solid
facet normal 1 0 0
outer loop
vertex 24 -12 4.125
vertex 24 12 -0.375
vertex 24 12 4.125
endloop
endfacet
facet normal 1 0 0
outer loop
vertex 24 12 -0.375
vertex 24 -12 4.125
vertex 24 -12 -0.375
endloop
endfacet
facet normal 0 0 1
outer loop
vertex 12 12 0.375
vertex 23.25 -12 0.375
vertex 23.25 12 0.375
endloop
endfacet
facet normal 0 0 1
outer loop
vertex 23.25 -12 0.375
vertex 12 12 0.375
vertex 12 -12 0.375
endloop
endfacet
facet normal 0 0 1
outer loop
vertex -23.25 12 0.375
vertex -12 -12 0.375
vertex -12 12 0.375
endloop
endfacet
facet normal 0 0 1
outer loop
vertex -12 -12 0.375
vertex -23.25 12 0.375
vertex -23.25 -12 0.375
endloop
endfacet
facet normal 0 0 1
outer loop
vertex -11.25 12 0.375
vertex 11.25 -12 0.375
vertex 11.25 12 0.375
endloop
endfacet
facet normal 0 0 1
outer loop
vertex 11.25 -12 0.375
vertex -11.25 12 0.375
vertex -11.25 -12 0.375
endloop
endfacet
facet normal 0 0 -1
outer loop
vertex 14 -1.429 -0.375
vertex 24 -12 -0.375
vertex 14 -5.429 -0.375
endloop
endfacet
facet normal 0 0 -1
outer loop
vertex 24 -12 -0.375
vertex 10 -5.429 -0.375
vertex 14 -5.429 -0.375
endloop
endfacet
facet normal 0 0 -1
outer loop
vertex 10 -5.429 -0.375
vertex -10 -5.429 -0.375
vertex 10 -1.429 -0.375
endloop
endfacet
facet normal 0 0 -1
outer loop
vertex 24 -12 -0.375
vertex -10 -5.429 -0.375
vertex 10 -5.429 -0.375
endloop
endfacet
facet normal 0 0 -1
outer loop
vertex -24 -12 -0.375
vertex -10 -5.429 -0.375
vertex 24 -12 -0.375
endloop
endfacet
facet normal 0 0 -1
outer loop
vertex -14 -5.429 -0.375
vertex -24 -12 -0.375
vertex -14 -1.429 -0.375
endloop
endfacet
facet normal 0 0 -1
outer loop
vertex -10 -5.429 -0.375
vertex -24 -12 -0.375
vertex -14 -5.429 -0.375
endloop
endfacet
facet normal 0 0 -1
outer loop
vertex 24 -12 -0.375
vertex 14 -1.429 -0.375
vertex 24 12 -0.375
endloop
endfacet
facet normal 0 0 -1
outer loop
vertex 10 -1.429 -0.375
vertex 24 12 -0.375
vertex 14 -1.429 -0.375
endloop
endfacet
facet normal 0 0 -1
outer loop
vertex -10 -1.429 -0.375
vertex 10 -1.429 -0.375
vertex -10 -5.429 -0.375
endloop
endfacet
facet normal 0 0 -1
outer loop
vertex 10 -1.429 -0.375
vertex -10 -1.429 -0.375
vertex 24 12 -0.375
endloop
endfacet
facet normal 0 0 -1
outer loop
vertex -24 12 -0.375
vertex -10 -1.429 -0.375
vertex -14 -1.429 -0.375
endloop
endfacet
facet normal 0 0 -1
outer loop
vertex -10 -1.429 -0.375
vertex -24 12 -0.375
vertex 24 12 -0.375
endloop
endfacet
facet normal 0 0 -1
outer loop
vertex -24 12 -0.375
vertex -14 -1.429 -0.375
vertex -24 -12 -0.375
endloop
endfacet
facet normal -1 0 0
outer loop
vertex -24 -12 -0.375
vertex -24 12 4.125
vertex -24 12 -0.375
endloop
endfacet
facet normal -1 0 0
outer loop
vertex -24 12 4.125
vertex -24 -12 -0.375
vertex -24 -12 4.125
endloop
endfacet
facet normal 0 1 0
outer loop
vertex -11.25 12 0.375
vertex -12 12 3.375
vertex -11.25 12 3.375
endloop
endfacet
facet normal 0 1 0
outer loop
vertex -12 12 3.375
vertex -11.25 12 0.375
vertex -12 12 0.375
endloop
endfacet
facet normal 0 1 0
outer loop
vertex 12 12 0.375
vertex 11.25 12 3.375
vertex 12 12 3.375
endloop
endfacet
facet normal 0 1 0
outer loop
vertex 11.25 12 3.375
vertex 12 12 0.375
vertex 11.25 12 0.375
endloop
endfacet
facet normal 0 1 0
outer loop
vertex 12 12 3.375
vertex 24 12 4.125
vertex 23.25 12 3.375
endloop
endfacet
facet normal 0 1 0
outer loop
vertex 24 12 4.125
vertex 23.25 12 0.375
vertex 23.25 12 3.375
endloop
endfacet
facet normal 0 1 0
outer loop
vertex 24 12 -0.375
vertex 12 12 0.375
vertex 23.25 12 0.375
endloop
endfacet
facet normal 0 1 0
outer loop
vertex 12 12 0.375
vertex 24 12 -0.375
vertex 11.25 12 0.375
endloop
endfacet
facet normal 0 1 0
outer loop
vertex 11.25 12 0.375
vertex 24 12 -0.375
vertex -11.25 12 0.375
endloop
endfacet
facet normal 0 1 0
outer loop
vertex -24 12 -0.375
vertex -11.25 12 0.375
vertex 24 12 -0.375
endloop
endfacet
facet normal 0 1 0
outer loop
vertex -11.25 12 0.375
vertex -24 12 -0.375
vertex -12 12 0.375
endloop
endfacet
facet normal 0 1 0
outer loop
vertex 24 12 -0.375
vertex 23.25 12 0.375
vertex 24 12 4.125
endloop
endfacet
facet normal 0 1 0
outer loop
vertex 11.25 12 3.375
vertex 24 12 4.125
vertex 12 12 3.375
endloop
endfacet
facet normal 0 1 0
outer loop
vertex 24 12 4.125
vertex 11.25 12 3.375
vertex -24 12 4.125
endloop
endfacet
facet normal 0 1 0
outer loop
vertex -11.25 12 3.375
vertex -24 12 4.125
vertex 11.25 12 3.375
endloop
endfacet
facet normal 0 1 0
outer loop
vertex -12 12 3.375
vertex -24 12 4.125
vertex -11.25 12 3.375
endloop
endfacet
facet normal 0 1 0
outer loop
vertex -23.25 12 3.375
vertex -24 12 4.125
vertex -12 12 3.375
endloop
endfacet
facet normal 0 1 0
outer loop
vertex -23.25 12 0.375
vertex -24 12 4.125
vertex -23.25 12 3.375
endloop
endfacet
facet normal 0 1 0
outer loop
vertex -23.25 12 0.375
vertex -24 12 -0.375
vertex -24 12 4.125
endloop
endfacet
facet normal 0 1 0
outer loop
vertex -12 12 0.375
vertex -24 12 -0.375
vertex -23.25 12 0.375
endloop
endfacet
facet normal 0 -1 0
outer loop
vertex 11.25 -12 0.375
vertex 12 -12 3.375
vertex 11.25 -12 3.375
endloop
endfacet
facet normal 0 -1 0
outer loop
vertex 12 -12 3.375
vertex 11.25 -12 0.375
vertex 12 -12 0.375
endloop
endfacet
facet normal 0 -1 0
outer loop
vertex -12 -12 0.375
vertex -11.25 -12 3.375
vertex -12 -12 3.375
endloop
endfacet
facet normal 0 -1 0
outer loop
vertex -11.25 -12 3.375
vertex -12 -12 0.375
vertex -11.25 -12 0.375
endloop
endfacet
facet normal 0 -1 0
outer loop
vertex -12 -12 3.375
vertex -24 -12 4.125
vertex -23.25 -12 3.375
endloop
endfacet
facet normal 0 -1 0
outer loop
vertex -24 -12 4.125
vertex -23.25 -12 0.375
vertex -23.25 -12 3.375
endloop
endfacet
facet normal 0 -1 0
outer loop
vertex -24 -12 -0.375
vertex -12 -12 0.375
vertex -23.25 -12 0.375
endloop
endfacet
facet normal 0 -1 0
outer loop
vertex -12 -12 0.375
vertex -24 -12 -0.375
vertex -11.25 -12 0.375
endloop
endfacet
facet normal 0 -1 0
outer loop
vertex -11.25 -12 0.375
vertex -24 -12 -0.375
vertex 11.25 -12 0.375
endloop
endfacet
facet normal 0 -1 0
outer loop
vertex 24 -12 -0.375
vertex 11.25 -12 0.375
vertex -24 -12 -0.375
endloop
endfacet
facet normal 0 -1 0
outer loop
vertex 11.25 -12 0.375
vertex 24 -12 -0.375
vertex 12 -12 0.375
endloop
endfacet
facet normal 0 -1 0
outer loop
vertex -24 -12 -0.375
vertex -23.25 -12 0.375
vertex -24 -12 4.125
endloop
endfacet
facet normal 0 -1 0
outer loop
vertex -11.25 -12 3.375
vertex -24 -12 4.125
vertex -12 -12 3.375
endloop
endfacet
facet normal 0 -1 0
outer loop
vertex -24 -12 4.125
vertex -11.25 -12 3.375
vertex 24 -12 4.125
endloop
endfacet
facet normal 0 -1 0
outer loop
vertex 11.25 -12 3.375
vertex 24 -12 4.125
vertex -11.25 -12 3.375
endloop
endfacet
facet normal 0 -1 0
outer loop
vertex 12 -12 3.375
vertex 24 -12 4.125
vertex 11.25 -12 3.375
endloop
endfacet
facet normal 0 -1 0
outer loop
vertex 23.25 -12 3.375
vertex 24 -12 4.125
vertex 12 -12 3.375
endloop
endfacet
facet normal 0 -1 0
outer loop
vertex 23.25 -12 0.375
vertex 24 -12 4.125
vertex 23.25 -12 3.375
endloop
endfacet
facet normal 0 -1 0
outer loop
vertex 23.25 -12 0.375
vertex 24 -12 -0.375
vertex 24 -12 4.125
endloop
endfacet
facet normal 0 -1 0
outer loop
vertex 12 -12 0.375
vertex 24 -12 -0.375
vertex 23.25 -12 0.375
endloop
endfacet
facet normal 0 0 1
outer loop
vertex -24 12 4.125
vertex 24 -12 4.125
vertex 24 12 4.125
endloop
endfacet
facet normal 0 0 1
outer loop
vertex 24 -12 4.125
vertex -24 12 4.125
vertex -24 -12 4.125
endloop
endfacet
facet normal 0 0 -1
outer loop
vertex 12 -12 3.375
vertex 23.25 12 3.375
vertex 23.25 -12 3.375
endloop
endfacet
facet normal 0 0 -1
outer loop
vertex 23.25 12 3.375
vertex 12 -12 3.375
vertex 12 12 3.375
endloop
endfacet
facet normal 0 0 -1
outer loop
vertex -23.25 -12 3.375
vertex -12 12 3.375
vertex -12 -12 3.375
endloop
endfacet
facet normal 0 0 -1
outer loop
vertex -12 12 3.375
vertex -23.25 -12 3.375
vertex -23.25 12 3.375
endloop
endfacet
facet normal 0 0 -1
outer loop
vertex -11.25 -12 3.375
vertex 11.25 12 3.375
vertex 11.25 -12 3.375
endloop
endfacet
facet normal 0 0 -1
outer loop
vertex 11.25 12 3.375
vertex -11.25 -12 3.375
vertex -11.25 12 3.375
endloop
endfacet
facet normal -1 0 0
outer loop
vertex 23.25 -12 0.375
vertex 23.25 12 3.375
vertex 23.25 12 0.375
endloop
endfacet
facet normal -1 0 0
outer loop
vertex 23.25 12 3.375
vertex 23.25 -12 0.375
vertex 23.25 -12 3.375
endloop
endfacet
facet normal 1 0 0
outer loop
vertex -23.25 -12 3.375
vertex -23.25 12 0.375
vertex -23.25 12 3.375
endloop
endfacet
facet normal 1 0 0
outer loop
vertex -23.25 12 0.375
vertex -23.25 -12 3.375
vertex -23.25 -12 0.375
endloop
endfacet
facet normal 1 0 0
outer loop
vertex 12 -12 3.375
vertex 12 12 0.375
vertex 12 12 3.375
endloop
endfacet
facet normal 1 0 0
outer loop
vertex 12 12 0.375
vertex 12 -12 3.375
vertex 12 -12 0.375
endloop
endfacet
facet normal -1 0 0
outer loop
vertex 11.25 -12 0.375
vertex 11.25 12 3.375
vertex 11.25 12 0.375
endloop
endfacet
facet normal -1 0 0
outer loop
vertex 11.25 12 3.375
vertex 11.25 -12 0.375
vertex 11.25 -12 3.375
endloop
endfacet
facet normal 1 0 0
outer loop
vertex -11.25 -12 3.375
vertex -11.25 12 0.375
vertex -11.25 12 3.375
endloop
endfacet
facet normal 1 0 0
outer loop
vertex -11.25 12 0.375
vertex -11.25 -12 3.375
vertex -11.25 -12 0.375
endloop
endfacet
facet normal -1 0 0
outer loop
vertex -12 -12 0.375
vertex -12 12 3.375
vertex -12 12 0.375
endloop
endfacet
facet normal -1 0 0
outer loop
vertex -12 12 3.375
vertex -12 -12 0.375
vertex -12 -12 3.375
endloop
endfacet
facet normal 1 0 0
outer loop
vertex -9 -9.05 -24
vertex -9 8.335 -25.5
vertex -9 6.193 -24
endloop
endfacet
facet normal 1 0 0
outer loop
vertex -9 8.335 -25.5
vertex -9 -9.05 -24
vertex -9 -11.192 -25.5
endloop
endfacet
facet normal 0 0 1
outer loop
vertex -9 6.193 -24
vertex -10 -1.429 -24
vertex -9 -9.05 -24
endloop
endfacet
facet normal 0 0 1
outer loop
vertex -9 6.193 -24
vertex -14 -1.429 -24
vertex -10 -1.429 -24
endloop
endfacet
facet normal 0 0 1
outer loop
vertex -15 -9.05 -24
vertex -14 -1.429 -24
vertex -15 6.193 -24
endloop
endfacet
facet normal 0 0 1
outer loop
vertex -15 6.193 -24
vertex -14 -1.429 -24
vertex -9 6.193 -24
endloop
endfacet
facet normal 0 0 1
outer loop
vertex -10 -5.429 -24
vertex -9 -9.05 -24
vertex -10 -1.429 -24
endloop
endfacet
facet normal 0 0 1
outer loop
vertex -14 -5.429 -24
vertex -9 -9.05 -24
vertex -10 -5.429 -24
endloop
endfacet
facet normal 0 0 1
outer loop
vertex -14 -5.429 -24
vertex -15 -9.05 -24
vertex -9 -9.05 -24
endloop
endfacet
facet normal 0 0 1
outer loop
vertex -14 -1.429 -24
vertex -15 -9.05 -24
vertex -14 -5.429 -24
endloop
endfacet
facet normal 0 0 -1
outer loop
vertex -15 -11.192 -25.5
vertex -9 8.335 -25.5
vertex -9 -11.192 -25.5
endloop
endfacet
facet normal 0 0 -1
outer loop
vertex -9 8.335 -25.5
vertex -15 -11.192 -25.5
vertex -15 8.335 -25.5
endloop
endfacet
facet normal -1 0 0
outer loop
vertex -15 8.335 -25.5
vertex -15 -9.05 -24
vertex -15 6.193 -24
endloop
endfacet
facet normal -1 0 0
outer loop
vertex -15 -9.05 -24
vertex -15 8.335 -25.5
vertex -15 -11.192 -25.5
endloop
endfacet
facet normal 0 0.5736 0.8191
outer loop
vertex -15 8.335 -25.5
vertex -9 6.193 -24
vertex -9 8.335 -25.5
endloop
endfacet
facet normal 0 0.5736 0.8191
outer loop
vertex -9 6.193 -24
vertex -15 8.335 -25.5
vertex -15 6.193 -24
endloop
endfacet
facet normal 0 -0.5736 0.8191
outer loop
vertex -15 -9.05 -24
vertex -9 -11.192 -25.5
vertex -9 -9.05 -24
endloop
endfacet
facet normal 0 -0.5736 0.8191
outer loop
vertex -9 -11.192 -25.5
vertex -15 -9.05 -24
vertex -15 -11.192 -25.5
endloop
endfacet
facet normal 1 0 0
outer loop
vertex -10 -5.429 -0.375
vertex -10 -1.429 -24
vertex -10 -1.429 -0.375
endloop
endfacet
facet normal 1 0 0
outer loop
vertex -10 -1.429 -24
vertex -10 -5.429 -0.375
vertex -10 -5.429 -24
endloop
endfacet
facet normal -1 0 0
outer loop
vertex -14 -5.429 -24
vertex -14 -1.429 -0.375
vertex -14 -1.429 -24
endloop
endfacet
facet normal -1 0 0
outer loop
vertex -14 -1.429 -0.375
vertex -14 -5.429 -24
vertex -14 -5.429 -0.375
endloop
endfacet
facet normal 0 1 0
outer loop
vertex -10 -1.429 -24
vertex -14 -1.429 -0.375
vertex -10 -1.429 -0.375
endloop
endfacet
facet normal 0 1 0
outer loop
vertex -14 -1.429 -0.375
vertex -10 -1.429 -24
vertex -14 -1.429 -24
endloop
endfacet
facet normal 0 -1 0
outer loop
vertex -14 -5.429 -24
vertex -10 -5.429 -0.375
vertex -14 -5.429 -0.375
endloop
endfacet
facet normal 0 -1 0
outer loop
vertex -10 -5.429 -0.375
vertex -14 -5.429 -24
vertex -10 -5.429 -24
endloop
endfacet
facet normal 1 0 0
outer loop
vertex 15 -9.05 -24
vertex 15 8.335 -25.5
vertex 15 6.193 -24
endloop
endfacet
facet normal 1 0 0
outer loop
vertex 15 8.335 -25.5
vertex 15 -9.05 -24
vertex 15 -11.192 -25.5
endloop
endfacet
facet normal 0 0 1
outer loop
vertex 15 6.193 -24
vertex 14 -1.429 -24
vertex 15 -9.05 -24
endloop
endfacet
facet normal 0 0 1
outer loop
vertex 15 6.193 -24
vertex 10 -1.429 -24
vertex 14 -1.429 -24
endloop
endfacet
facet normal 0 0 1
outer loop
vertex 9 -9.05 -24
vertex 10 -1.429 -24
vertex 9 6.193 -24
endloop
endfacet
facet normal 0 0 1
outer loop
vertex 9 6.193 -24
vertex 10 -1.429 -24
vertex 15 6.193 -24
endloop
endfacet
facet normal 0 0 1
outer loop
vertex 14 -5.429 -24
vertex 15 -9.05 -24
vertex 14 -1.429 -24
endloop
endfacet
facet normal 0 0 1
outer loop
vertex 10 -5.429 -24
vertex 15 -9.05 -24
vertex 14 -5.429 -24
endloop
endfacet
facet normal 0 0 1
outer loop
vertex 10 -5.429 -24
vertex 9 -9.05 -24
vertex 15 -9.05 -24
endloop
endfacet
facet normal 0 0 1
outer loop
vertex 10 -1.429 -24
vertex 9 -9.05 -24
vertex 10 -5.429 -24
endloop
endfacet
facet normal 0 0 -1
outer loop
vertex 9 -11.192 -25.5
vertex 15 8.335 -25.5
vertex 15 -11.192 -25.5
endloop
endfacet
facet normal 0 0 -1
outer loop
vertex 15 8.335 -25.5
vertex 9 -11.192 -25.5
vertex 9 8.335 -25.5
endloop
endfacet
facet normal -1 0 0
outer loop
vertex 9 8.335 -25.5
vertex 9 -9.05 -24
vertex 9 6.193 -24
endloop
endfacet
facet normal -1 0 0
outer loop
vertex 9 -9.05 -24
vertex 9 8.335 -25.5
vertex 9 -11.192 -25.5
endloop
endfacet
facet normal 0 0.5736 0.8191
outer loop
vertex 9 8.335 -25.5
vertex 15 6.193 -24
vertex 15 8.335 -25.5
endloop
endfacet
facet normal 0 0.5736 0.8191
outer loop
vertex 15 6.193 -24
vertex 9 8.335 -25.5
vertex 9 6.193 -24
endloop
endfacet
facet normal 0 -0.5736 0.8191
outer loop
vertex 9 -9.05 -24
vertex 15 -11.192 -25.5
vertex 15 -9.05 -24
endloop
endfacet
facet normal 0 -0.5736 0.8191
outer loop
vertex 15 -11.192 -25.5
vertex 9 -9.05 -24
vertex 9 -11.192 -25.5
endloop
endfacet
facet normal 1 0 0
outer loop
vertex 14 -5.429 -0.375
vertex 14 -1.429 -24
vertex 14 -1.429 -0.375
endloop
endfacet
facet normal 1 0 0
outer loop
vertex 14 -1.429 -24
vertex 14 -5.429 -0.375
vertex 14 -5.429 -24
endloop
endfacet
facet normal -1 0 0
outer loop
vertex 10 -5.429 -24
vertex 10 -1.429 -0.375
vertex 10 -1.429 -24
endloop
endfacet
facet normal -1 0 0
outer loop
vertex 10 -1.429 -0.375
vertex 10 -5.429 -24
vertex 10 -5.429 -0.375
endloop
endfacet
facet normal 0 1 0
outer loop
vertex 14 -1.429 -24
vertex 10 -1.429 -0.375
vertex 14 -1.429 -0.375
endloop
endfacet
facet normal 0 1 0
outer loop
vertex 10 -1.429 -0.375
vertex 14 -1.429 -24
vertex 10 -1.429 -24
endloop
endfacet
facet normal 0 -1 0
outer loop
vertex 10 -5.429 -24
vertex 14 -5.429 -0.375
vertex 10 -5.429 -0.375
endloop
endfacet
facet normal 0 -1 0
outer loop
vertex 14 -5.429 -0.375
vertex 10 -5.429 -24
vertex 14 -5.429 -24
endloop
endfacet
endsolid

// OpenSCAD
/* Basic design for an adjustable standing/sitting desk /*
/*

*/

deskWidth = 48;
deskDepth = 24;
legHeight =24;
footDepth = 20;
footWidth = 6;
footHeight = 1.5;
pwt = 0.75; // Plywood Thickness

/* Put it all together */
fullDesk();

//all the things
module fullDesk() {
	deskTop();
	translate([-(deskWidth/4),-(deskDepth/7),-(legHeight/2)]) {
		deskLeg();
	}
	translate([deskWidth/4,-(deskDepth/7),-(legHeight/2)]) {
		deskLeg();
	}
}


// defines the main desk surface:
module deskSurface() {
	cube(size=[deskWidth, deskDepth, pwt], center=true);
}

// divider
module deskDivider(x, y, z) {
	translate([x, y, z]) {
		cube(size=[pwt, deskDepth, 3], center=true);
	}
}

// top pieces fit together
module deskTop() {
	union() {
		deskSurface();
		translate([0, 0, 3 + pwt]) {
			deskSurface();
		}
		deskDivider((deskWidth/2) - pwt/2, 0, (3 + pwt) / 2); // right end
		deskDivider(-((deskWidth/2) - pwt/2), 0, (3 + pwt) / 2); // left end
		deskDivider((deskWidth/4) - pwt/2, 0, (3 + pwt) / 2); // right divider
		deskDivider(-((deskWidth/4) - pwt/2), 0, (3 + pwt) / 2); // left divider
	}
}

// pretty foot
module foot() {
	
	difference() {
		cube([footWidth, footDepth, footHeight], center=true);
		translate([0, footDepth/2, 0]) {
			rotate(145, [1,0,0]) {
				cube([footWidth, footDepth, footHeight], center=true);
			}
		}
		translate([0, -(footDepth/2), 0]) {
			rotate(35, [1,0,0]) {
				cube([footWidth, footDepth, footHeight], center=true);
			}
		}
	}
}

module innerLeg() {
	
}

// yes, outer leg
module outerLeg() {
	cube([2*(footWidth/3), 2*(footWidth/3), legHeight], center=true);
}


module deskLeg() {
	innerLeg();
	outerLeg();
	translate([0, footDepth/10, -(legHeight/2 + .75)]) {
		foot();
	}
}
